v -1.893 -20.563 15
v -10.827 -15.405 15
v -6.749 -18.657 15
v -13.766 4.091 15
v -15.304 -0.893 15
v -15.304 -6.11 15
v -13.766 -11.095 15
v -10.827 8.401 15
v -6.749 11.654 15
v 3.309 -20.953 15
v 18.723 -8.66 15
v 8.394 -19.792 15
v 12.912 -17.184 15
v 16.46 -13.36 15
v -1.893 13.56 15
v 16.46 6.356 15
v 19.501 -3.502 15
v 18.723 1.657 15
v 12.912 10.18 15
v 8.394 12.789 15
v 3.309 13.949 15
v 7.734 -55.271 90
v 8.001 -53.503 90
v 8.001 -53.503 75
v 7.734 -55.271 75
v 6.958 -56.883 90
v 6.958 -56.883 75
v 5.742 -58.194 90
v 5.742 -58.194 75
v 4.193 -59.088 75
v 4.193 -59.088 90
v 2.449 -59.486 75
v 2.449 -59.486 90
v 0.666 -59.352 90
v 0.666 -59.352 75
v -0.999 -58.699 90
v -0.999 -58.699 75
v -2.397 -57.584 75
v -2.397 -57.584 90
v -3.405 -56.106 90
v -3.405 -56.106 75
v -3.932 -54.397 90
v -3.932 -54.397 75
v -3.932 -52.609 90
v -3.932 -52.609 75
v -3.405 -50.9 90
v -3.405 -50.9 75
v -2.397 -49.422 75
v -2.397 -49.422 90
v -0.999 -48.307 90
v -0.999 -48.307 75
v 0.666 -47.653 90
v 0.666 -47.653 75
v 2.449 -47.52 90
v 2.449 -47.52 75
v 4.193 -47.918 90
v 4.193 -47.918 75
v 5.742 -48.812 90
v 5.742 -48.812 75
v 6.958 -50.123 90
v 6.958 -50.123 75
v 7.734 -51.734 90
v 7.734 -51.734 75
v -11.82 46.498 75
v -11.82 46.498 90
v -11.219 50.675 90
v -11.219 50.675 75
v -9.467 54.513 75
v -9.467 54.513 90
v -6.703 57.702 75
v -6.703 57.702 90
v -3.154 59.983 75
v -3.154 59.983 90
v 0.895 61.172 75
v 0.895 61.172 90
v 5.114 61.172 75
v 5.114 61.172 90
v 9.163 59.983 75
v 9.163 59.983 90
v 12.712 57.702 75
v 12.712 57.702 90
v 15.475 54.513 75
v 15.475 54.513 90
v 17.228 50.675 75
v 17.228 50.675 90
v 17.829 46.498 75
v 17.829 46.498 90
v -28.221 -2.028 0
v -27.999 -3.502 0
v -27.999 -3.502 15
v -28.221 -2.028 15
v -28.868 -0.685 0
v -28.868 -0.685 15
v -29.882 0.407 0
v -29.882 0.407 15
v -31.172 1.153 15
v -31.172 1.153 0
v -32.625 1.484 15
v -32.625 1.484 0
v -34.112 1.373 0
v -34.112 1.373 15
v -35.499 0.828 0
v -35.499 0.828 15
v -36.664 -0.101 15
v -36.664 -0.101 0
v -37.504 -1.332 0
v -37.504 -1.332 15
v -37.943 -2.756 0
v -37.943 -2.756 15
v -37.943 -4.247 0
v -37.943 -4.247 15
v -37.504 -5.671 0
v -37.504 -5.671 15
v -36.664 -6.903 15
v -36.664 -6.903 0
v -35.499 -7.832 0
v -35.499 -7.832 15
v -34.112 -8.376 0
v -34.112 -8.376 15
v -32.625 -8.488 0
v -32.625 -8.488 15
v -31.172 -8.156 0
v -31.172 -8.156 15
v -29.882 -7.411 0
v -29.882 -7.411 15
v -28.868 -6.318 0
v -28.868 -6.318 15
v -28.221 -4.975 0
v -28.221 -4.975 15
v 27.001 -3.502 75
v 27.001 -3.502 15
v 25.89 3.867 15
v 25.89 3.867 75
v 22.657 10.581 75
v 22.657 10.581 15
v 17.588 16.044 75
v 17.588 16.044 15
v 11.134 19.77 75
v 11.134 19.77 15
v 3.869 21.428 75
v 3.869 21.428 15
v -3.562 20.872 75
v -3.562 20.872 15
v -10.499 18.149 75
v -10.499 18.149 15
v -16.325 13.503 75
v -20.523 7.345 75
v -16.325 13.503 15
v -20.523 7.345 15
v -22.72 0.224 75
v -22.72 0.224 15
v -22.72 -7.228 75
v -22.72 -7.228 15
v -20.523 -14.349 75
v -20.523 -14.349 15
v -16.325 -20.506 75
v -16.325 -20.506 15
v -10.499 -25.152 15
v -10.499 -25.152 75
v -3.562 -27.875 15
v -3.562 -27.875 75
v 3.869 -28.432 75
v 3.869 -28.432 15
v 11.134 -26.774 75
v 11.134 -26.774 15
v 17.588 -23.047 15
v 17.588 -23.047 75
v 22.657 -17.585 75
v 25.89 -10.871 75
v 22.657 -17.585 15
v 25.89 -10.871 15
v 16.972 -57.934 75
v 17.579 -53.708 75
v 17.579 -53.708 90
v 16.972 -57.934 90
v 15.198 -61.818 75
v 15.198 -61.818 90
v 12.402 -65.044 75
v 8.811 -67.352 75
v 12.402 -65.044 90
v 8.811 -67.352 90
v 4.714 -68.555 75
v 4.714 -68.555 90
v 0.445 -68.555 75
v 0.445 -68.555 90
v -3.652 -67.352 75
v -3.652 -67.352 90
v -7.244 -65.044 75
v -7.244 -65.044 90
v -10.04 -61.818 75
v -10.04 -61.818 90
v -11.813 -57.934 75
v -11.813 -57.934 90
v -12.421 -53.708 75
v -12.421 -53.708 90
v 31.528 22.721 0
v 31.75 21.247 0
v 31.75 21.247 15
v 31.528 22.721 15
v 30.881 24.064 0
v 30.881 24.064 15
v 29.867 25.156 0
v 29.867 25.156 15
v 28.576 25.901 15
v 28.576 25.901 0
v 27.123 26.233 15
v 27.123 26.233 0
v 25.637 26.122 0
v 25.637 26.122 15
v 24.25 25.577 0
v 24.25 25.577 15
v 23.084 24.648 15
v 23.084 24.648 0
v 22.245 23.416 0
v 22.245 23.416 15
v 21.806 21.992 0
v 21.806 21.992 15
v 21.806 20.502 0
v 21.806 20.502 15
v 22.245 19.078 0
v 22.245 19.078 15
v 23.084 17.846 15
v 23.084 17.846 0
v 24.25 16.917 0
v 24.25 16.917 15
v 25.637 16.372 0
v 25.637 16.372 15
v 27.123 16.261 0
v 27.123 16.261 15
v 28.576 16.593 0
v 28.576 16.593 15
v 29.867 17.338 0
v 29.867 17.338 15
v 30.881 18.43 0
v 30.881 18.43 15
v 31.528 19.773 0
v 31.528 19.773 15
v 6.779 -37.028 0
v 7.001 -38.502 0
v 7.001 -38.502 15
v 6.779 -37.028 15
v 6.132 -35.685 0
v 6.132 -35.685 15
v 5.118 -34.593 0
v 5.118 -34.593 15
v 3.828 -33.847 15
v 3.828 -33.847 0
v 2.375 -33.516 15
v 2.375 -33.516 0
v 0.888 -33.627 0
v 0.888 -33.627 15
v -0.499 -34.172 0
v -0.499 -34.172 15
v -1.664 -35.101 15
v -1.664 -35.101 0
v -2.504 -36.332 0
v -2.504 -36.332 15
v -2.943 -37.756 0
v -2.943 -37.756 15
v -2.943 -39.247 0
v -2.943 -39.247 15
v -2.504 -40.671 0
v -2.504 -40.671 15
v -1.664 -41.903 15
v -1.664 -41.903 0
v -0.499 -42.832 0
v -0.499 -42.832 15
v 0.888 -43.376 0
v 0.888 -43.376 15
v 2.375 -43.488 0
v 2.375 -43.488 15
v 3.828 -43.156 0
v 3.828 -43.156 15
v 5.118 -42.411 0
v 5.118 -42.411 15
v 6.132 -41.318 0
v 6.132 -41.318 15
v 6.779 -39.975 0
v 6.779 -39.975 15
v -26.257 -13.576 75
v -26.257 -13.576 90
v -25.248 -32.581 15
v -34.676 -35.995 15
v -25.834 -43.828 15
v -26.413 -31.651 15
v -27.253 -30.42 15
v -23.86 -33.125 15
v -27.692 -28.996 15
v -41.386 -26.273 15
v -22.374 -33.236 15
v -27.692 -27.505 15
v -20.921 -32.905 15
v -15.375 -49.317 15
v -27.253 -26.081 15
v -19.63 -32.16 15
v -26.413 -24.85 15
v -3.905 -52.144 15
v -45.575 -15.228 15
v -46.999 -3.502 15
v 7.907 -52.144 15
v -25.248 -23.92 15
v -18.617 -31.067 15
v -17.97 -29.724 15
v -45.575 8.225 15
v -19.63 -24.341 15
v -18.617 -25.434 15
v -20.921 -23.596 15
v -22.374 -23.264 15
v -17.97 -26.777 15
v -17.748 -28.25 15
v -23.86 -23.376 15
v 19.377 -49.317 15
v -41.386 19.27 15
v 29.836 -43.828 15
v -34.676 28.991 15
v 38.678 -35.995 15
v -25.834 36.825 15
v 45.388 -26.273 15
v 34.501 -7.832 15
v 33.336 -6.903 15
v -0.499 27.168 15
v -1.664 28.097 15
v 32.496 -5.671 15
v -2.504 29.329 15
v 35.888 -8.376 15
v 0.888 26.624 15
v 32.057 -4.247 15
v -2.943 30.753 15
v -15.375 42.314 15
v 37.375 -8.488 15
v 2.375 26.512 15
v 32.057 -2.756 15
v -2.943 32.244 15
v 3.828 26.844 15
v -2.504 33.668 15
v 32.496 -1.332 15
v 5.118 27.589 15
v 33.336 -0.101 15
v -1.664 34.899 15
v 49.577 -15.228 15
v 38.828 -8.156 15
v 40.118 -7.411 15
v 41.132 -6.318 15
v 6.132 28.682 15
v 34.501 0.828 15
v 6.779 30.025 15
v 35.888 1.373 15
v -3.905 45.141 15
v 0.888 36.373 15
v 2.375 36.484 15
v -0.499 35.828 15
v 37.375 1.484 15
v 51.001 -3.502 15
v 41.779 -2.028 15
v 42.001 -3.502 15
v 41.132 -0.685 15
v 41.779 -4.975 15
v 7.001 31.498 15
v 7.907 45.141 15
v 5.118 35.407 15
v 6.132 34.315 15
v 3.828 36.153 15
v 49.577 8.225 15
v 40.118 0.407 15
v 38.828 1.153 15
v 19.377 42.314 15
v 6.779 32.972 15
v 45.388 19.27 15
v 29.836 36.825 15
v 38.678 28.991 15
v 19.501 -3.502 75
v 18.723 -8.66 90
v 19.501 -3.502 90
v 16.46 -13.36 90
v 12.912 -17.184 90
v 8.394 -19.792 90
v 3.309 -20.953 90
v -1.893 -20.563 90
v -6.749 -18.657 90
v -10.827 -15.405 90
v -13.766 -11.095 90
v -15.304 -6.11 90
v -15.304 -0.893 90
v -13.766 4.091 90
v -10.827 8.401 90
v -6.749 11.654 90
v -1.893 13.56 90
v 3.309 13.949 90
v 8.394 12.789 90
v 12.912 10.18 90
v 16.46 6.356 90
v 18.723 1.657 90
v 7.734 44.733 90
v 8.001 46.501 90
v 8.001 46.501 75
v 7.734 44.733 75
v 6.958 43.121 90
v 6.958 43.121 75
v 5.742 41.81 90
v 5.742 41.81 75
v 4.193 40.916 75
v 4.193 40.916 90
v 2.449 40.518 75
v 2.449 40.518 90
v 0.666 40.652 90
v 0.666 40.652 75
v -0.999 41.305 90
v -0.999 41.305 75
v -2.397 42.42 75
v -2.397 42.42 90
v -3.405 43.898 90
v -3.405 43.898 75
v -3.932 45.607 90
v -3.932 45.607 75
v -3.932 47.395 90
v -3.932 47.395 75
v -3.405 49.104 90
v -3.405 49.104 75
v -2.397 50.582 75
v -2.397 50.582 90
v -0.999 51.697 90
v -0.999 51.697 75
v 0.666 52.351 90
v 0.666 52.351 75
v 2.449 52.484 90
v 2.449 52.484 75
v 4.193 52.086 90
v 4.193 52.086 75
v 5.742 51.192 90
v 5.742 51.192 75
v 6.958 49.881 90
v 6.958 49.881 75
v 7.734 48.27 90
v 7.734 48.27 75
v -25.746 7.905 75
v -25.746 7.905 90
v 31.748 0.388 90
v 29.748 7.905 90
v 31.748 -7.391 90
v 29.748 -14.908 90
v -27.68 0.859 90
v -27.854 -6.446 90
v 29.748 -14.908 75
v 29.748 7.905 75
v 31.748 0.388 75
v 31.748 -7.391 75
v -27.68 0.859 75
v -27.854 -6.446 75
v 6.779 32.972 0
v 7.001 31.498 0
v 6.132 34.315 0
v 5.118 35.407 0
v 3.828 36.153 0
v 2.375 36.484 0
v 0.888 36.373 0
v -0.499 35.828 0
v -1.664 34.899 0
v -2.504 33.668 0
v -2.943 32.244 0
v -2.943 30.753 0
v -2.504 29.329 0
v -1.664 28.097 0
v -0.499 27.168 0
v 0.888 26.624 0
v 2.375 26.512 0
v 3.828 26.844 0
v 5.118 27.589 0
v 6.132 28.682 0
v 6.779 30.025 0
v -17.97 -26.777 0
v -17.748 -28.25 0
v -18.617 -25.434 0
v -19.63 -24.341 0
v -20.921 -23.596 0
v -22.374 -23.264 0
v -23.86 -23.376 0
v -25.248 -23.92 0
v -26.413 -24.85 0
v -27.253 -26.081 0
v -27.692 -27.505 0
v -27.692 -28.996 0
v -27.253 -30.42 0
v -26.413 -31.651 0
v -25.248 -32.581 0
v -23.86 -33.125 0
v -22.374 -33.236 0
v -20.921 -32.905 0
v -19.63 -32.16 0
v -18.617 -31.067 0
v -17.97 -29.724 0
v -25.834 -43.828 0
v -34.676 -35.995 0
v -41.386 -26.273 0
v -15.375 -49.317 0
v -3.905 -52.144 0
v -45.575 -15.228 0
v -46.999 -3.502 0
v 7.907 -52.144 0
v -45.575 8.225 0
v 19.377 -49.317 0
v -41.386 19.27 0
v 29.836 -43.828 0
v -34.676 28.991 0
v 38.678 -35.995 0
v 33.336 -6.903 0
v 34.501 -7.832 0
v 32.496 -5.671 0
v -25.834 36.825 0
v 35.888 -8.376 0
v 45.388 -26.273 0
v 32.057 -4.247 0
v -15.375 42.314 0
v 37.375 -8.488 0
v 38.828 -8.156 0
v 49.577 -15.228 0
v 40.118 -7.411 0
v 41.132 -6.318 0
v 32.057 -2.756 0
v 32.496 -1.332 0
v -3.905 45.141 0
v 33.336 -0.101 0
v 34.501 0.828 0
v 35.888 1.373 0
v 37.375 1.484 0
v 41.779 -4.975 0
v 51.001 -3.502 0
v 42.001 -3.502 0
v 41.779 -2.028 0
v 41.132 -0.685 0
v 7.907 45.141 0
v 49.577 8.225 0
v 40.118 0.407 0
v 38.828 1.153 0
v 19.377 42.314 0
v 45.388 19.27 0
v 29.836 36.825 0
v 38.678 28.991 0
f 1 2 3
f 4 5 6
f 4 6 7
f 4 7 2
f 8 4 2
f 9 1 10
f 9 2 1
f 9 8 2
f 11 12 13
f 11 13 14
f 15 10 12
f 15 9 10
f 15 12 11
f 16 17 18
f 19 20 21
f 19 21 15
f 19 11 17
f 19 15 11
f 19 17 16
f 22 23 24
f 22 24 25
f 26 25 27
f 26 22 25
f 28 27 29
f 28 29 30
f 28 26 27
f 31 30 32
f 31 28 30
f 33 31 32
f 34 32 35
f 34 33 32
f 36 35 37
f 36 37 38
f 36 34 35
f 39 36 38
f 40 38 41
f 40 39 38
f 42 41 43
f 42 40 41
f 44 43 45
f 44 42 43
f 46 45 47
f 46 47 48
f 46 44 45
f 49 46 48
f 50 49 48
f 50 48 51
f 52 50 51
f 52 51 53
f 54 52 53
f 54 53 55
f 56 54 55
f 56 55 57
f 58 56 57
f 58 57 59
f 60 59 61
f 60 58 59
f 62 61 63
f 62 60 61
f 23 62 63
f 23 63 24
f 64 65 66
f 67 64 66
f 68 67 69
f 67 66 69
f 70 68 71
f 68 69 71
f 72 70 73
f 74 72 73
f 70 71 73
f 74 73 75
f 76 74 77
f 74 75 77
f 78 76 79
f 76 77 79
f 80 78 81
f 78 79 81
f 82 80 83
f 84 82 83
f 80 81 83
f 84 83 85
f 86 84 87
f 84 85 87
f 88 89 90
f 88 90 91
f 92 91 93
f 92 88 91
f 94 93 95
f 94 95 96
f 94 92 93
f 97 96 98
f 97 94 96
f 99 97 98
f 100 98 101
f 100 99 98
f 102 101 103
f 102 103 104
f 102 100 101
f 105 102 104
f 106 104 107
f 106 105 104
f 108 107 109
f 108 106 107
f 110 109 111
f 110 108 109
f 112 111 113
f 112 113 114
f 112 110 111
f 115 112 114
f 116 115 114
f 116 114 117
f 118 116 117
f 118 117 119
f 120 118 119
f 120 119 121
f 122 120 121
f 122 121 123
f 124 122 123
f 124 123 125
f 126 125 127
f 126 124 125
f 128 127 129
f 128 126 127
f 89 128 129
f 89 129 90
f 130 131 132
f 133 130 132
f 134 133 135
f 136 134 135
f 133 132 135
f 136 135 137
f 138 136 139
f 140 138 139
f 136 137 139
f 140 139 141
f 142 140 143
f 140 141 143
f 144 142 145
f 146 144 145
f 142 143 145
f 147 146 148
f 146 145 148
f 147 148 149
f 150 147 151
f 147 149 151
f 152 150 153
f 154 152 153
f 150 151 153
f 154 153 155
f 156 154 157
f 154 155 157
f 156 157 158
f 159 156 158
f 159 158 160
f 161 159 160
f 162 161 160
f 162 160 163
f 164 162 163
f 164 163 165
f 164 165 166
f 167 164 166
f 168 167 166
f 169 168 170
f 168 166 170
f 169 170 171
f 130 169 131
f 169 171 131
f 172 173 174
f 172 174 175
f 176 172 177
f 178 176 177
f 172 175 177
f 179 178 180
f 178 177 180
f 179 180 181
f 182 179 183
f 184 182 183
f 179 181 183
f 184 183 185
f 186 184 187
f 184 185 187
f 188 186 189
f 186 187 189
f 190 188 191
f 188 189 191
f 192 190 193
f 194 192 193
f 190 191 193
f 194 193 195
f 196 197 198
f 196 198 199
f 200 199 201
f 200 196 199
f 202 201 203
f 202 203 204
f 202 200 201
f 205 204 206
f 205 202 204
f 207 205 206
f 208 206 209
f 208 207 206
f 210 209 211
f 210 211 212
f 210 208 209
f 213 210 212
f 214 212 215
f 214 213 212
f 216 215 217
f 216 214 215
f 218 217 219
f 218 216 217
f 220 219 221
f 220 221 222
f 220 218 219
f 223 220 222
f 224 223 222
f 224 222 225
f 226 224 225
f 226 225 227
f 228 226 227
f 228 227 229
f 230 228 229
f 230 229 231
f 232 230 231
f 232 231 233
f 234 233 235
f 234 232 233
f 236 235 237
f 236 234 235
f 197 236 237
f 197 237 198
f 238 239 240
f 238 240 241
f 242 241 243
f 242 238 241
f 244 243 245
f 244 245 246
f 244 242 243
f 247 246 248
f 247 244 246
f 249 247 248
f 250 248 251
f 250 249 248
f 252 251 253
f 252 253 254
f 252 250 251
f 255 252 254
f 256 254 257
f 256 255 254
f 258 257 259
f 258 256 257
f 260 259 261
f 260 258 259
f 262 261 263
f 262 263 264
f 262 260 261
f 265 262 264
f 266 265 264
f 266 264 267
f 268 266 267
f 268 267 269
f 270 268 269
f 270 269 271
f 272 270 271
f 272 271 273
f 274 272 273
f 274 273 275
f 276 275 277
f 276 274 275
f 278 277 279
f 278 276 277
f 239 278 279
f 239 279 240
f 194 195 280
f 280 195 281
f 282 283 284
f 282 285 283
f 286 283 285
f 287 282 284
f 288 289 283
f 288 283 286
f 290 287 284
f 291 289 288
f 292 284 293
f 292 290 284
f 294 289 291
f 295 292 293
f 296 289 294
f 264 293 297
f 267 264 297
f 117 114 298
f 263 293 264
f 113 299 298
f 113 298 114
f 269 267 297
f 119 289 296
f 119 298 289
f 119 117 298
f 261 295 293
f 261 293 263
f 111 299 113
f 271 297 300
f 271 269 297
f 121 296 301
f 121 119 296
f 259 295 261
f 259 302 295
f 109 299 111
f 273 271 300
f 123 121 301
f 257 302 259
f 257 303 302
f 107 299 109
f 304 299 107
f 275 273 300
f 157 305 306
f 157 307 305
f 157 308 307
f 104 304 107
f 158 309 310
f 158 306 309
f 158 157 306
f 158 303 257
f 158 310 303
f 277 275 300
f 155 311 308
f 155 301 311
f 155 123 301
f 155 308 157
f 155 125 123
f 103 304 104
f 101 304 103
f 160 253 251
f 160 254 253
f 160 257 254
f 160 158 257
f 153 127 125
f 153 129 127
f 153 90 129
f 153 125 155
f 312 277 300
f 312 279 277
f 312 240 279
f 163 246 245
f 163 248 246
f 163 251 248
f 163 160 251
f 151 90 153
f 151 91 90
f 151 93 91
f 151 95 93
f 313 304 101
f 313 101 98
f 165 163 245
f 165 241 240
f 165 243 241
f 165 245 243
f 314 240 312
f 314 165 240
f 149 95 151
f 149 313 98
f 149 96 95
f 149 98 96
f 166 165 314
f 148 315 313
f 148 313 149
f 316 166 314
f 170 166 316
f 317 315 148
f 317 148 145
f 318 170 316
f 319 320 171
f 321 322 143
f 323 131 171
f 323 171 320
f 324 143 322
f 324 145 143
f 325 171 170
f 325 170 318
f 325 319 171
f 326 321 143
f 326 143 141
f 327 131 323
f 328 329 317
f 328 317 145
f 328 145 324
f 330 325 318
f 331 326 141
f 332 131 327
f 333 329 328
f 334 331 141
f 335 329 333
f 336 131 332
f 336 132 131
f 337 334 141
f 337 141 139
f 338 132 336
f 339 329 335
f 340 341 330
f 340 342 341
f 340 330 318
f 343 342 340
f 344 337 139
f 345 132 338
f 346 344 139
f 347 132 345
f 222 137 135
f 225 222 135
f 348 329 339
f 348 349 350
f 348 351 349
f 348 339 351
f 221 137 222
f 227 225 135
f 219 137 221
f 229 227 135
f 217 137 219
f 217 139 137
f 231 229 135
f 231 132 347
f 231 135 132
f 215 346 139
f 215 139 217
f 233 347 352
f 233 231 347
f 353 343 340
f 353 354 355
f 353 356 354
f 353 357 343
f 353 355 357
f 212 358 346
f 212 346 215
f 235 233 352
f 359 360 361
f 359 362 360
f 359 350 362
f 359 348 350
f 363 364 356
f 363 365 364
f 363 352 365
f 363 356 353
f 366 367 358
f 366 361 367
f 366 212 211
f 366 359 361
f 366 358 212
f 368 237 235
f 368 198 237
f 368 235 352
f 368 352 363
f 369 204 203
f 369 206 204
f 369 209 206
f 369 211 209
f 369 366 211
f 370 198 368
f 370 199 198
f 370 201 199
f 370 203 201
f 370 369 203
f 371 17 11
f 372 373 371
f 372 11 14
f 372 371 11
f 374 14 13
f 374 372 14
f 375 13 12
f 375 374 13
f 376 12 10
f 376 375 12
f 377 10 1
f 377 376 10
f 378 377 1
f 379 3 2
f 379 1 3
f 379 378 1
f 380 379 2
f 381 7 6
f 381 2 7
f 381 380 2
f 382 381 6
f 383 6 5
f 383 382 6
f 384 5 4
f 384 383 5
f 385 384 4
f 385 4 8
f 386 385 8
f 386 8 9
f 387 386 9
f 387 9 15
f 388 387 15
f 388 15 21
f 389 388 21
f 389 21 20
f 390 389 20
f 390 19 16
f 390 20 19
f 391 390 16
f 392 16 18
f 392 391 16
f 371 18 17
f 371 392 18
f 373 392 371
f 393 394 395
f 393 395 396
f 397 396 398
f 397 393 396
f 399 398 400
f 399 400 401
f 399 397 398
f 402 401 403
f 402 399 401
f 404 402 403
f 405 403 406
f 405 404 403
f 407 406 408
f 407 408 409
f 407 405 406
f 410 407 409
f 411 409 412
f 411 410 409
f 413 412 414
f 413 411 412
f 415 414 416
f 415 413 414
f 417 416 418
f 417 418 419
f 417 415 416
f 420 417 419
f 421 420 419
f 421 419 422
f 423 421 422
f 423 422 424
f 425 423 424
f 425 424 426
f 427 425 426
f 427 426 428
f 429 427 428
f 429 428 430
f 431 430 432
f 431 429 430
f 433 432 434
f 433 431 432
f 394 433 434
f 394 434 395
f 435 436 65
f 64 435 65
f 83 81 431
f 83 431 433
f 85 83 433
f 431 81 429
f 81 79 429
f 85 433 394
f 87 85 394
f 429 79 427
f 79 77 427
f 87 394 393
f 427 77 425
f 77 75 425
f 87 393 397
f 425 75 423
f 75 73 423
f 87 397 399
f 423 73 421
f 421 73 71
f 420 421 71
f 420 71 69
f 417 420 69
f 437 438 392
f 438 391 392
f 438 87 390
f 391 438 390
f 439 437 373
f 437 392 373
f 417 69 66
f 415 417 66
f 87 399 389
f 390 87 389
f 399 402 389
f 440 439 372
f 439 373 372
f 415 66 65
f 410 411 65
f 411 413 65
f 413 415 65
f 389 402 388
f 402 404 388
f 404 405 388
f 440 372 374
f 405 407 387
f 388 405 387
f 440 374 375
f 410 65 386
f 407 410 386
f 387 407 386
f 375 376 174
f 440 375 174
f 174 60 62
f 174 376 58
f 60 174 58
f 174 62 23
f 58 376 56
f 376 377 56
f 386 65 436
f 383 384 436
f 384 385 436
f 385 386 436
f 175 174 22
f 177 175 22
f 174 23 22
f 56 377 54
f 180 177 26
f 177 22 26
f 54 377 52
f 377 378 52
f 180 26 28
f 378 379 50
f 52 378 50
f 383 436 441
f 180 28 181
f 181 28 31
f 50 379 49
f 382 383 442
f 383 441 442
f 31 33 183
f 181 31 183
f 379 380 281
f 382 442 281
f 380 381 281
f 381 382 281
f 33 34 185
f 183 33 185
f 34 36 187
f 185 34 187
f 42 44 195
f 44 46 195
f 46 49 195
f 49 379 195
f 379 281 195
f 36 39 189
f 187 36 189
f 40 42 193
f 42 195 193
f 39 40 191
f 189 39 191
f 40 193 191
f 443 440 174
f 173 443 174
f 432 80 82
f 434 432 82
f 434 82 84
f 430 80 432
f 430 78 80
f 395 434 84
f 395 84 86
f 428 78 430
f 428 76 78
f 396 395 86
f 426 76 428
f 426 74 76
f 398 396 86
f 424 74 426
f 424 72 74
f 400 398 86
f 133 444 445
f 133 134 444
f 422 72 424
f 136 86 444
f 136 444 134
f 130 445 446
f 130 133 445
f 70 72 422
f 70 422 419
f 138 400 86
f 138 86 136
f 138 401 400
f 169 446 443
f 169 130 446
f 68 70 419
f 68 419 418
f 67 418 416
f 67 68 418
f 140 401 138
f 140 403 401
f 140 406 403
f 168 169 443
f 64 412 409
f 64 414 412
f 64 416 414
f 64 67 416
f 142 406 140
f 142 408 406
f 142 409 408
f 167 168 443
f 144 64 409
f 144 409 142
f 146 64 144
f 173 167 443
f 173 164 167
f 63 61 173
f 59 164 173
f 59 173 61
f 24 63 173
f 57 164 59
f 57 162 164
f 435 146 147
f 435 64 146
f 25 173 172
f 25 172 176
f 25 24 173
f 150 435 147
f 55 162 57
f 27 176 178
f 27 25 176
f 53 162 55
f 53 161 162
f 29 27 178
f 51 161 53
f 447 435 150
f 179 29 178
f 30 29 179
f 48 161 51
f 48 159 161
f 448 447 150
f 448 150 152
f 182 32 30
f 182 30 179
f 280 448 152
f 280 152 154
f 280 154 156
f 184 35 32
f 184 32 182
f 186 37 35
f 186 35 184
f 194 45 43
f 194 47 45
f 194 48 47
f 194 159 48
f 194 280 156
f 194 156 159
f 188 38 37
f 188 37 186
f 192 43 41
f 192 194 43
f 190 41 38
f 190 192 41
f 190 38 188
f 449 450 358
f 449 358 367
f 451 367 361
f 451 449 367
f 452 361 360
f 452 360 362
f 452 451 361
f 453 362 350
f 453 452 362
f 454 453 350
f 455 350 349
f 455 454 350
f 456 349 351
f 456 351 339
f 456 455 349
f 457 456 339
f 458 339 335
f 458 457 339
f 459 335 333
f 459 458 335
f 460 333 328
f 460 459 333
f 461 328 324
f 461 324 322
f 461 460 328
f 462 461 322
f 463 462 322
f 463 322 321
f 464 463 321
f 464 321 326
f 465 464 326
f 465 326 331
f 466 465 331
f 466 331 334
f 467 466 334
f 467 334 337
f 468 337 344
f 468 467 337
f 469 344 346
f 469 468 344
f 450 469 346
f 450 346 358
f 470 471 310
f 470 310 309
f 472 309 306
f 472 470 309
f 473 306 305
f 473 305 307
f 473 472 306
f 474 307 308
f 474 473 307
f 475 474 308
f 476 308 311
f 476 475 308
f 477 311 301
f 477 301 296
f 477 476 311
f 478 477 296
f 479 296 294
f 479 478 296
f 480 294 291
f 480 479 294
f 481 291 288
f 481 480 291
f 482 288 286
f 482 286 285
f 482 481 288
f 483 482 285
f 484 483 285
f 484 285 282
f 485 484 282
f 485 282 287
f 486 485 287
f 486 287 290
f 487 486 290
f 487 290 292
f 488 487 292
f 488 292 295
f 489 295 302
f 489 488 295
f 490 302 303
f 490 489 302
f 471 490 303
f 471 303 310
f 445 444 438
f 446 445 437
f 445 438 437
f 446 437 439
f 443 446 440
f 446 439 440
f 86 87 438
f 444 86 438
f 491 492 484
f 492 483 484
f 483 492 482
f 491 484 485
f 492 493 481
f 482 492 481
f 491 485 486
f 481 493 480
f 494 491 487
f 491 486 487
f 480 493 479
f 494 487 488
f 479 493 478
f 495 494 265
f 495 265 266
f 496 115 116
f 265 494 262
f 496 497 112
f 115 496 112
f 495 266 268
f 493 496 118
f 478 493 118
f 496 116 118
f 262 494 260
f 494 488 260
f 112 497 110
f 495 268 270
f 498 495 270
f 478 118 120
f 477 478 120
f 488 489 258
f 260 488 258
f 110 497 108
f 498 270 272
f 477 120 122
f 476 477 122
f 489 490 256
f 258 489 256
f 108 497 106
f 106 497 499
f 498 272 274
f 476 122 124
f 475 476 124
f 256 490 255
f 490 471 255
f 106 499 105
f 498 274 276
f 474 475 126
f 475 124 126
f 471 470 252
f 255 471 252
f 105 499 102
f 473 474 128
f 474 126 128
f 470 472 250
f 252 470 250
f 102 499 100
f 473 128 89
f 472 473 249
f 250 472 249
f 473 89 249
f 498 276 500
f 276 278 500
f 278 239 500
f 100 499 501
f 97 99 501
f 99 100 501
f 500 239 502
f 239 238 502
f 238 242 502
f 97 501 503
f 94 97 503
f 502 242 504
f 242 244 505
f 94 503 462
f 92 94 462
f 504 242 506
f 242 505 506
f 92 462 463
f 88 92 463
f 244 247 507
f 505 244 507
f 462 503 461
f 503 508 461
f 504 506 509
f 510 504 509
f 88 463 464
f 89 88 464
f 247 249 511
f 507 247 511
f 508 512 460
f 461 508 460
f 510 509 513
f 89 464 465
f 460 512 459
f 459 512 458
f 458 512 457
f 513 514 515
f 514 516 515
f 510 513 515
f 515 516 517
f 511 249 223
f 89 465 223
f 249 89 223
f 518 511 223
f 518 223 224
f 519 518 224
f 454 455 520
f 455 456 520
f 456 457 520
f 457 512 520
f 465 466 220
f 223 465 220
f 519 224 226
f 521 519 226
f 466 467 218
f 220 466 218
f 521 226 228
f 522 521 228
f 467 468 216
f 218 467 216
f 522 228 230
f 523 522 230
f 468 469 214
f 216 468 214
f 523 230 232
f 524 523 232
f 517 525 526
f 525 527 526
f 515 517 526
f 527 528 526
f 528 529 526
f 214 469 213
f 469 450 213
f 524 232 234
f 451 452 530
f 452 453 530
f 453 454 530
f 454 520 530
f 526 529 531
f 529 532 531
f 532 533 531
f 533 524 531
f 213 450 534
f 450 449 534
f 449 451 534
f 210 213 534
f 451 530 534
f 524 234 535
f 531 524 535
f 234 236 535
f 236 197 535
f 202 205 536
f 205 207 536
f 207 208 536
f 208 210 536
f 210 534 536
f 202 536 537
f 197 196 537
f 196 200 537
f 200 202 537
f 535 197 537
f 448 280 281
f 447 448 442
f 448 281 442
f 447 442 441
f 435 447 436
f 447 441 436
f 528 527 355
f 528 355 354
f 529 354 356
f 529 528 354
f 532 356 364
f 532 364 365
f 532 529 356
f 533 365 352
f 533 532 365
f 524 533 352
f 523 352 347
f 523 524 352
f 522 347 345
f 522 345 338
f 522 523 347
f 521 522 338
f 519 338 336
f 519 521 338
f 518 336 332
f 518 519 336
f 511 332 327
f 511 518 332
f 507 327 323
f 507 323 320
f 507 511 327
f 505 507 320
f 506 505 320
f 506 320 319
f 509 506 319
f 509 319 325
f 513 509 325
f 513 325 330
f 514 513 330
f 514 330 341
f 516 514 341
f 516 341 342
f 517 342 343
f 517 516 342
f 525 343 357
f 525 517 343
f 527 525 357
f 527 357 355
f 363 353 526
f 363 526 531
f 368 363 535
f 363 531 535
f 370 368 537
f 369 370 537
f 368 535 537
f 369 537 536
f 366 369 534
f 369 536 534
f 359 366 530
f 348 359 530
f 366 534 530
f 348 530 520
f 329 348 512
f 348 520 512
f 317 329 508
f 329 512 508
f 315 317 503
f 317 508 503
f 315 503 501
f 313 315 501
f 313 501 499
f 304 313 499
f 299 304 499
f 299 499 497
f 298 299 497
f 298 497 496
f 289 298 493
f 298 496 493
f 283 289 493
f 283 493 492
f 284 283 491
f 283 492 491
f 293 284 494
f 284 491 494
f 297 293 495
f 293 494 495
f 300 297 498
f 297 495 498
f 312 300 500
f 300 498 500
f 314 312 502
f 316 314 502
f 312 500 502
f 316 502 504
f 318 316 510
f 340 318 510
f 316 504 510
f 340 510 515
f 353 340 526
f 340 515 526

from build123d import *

# Parameters (mm, degrees)
SKETCH1_R           = 49
SKETCH1_R_2         = 5
BOSS_EXTRUDE1_DEPTH = 15
SKETCH2_R           = 25
BOSS_EXTRUDE2_DEPTH = 60
F_3DSKETCH1_R       = 17.5
F_3DSKETCH1_R_2     = 6
BOSS_EXTRUDE3_DEPTH = 15
SKETCH3_R           = 17.5
CUT_EXTRUDE1_DEPTH  = 60


with BuildPart() as part:
    # Sketch1 → Boss-Extrude1 (new body)
    with BuildSketch(Plane.XY):
        with Locations((2.00095732, -3.501675309)):
            Circle(SKETCH1_R)
        with Locations((2.00095732, 31.498324691)):
            Circle(SKETCH1_R_2, mode=Mode.SUBTRACT)
        with Locations((37.00095732, -3.501675309)):
            Circle(SKETCH1_R_2, mode=Mode.SUBTRACT)
        with Locations((2.00095732, -38.501675309)):
            Circle(SKETCH1_R_2, mode=Mode.SUBTRACT)
        with Locations((-32.99904268, -3.501675309)):
            Circle(SKETCH1_R_2, mode=Mode.SUBTRACT)
        with Locations((26.749694661, 21.247062032)):
            Circle(SKETCH1_R_2, mode=Mode.SUBTRACT)
        with Locations((-22.747780022, -28.250412651)):
            Circle(SKETCH1_R_2, mode=Mode.SUBTRACT)
    extrude(amount=BOSS_EXTRUDE1_DEPTH)

    # Sketch2 → Boss-Extrude2 (add)
    with BuildSketch(Plane.XY.offset(15)):
        with Locations((2.00095732, -3.501675309)):
            Circle(SKETCH2_R)
    extrude(amount=BOSS_EXTRUDE2_DEPTH)

    # 3DSketch1 → Boss-Extrude3 (add)
    with BuildSketch(Plane(origin=(17.828624009, 46.498324691, 90), x_dir=(-0.2889903749033983, -0.9573320026057801, 0), z_dir=(0, 0, -1))):
        with BuildLine():
            Line((0, 0), (33.502008681, -22.56364586))
            ThreePointArc((33.502008681, -22.56364586), (43.770932214, -28.017146975), (55.342156817, -29.156544228))
            Line((55.342156817, -29.156544228), (96.002707212, -28.719960078))
            ThreePointArc((96.002707212, -28.719960078), (114.697542875, -18.694835663), (104.672418459, 0))
            Line((104.672418459, 0), (70.251663663, 24.843392205))
            ThreePointArc((70.251663663, 24.843392205), (60.424969024, 29.620810014), (49.539130104, 30.562170435))
            Line((49.539130104, 30.562170435), (8.568124101, 28.383434594))
            ThreePointArc((8.568124101, 28.383434594), (-9.907655246, 18.475779348), (0, 0))
        make_face()
        with Locations(Location((52.440643461, 0.702813104, 0), (0, 0, 253.202479102))):
            Circle(F_3DSKETCH1_R, mode=Mode.SUBTRACT)
        with Locations(Location((100.308395753, -13.747053445, 0), (0, 0, 253.202479102))):
            Circle(F_3DSKETCH1_R_2, mode=Mode.SUBTRACT)
        with Locations(Location((4.571400625, 15.153129604, 0), (0, 0, 253.202479102))):
            Circle(F_3DSKETCH1_R_2, mode=Mode.SUBTRACT)
    extrude(amount=BOSS_EXTRUDE3_DEPTH)

    # Sketch3 → Cut-Extrude1 (cut)
    with BuildSketch(Plane.XY.offset(75)):
        with Locations((2.00095732, -3.501675309)):
            Circle(SKETCH3_R)
    extrude(amount=-CUT_EXTRUDE1_DEPTH, mode=Mode.SUBTRACT)


solid = part.part
